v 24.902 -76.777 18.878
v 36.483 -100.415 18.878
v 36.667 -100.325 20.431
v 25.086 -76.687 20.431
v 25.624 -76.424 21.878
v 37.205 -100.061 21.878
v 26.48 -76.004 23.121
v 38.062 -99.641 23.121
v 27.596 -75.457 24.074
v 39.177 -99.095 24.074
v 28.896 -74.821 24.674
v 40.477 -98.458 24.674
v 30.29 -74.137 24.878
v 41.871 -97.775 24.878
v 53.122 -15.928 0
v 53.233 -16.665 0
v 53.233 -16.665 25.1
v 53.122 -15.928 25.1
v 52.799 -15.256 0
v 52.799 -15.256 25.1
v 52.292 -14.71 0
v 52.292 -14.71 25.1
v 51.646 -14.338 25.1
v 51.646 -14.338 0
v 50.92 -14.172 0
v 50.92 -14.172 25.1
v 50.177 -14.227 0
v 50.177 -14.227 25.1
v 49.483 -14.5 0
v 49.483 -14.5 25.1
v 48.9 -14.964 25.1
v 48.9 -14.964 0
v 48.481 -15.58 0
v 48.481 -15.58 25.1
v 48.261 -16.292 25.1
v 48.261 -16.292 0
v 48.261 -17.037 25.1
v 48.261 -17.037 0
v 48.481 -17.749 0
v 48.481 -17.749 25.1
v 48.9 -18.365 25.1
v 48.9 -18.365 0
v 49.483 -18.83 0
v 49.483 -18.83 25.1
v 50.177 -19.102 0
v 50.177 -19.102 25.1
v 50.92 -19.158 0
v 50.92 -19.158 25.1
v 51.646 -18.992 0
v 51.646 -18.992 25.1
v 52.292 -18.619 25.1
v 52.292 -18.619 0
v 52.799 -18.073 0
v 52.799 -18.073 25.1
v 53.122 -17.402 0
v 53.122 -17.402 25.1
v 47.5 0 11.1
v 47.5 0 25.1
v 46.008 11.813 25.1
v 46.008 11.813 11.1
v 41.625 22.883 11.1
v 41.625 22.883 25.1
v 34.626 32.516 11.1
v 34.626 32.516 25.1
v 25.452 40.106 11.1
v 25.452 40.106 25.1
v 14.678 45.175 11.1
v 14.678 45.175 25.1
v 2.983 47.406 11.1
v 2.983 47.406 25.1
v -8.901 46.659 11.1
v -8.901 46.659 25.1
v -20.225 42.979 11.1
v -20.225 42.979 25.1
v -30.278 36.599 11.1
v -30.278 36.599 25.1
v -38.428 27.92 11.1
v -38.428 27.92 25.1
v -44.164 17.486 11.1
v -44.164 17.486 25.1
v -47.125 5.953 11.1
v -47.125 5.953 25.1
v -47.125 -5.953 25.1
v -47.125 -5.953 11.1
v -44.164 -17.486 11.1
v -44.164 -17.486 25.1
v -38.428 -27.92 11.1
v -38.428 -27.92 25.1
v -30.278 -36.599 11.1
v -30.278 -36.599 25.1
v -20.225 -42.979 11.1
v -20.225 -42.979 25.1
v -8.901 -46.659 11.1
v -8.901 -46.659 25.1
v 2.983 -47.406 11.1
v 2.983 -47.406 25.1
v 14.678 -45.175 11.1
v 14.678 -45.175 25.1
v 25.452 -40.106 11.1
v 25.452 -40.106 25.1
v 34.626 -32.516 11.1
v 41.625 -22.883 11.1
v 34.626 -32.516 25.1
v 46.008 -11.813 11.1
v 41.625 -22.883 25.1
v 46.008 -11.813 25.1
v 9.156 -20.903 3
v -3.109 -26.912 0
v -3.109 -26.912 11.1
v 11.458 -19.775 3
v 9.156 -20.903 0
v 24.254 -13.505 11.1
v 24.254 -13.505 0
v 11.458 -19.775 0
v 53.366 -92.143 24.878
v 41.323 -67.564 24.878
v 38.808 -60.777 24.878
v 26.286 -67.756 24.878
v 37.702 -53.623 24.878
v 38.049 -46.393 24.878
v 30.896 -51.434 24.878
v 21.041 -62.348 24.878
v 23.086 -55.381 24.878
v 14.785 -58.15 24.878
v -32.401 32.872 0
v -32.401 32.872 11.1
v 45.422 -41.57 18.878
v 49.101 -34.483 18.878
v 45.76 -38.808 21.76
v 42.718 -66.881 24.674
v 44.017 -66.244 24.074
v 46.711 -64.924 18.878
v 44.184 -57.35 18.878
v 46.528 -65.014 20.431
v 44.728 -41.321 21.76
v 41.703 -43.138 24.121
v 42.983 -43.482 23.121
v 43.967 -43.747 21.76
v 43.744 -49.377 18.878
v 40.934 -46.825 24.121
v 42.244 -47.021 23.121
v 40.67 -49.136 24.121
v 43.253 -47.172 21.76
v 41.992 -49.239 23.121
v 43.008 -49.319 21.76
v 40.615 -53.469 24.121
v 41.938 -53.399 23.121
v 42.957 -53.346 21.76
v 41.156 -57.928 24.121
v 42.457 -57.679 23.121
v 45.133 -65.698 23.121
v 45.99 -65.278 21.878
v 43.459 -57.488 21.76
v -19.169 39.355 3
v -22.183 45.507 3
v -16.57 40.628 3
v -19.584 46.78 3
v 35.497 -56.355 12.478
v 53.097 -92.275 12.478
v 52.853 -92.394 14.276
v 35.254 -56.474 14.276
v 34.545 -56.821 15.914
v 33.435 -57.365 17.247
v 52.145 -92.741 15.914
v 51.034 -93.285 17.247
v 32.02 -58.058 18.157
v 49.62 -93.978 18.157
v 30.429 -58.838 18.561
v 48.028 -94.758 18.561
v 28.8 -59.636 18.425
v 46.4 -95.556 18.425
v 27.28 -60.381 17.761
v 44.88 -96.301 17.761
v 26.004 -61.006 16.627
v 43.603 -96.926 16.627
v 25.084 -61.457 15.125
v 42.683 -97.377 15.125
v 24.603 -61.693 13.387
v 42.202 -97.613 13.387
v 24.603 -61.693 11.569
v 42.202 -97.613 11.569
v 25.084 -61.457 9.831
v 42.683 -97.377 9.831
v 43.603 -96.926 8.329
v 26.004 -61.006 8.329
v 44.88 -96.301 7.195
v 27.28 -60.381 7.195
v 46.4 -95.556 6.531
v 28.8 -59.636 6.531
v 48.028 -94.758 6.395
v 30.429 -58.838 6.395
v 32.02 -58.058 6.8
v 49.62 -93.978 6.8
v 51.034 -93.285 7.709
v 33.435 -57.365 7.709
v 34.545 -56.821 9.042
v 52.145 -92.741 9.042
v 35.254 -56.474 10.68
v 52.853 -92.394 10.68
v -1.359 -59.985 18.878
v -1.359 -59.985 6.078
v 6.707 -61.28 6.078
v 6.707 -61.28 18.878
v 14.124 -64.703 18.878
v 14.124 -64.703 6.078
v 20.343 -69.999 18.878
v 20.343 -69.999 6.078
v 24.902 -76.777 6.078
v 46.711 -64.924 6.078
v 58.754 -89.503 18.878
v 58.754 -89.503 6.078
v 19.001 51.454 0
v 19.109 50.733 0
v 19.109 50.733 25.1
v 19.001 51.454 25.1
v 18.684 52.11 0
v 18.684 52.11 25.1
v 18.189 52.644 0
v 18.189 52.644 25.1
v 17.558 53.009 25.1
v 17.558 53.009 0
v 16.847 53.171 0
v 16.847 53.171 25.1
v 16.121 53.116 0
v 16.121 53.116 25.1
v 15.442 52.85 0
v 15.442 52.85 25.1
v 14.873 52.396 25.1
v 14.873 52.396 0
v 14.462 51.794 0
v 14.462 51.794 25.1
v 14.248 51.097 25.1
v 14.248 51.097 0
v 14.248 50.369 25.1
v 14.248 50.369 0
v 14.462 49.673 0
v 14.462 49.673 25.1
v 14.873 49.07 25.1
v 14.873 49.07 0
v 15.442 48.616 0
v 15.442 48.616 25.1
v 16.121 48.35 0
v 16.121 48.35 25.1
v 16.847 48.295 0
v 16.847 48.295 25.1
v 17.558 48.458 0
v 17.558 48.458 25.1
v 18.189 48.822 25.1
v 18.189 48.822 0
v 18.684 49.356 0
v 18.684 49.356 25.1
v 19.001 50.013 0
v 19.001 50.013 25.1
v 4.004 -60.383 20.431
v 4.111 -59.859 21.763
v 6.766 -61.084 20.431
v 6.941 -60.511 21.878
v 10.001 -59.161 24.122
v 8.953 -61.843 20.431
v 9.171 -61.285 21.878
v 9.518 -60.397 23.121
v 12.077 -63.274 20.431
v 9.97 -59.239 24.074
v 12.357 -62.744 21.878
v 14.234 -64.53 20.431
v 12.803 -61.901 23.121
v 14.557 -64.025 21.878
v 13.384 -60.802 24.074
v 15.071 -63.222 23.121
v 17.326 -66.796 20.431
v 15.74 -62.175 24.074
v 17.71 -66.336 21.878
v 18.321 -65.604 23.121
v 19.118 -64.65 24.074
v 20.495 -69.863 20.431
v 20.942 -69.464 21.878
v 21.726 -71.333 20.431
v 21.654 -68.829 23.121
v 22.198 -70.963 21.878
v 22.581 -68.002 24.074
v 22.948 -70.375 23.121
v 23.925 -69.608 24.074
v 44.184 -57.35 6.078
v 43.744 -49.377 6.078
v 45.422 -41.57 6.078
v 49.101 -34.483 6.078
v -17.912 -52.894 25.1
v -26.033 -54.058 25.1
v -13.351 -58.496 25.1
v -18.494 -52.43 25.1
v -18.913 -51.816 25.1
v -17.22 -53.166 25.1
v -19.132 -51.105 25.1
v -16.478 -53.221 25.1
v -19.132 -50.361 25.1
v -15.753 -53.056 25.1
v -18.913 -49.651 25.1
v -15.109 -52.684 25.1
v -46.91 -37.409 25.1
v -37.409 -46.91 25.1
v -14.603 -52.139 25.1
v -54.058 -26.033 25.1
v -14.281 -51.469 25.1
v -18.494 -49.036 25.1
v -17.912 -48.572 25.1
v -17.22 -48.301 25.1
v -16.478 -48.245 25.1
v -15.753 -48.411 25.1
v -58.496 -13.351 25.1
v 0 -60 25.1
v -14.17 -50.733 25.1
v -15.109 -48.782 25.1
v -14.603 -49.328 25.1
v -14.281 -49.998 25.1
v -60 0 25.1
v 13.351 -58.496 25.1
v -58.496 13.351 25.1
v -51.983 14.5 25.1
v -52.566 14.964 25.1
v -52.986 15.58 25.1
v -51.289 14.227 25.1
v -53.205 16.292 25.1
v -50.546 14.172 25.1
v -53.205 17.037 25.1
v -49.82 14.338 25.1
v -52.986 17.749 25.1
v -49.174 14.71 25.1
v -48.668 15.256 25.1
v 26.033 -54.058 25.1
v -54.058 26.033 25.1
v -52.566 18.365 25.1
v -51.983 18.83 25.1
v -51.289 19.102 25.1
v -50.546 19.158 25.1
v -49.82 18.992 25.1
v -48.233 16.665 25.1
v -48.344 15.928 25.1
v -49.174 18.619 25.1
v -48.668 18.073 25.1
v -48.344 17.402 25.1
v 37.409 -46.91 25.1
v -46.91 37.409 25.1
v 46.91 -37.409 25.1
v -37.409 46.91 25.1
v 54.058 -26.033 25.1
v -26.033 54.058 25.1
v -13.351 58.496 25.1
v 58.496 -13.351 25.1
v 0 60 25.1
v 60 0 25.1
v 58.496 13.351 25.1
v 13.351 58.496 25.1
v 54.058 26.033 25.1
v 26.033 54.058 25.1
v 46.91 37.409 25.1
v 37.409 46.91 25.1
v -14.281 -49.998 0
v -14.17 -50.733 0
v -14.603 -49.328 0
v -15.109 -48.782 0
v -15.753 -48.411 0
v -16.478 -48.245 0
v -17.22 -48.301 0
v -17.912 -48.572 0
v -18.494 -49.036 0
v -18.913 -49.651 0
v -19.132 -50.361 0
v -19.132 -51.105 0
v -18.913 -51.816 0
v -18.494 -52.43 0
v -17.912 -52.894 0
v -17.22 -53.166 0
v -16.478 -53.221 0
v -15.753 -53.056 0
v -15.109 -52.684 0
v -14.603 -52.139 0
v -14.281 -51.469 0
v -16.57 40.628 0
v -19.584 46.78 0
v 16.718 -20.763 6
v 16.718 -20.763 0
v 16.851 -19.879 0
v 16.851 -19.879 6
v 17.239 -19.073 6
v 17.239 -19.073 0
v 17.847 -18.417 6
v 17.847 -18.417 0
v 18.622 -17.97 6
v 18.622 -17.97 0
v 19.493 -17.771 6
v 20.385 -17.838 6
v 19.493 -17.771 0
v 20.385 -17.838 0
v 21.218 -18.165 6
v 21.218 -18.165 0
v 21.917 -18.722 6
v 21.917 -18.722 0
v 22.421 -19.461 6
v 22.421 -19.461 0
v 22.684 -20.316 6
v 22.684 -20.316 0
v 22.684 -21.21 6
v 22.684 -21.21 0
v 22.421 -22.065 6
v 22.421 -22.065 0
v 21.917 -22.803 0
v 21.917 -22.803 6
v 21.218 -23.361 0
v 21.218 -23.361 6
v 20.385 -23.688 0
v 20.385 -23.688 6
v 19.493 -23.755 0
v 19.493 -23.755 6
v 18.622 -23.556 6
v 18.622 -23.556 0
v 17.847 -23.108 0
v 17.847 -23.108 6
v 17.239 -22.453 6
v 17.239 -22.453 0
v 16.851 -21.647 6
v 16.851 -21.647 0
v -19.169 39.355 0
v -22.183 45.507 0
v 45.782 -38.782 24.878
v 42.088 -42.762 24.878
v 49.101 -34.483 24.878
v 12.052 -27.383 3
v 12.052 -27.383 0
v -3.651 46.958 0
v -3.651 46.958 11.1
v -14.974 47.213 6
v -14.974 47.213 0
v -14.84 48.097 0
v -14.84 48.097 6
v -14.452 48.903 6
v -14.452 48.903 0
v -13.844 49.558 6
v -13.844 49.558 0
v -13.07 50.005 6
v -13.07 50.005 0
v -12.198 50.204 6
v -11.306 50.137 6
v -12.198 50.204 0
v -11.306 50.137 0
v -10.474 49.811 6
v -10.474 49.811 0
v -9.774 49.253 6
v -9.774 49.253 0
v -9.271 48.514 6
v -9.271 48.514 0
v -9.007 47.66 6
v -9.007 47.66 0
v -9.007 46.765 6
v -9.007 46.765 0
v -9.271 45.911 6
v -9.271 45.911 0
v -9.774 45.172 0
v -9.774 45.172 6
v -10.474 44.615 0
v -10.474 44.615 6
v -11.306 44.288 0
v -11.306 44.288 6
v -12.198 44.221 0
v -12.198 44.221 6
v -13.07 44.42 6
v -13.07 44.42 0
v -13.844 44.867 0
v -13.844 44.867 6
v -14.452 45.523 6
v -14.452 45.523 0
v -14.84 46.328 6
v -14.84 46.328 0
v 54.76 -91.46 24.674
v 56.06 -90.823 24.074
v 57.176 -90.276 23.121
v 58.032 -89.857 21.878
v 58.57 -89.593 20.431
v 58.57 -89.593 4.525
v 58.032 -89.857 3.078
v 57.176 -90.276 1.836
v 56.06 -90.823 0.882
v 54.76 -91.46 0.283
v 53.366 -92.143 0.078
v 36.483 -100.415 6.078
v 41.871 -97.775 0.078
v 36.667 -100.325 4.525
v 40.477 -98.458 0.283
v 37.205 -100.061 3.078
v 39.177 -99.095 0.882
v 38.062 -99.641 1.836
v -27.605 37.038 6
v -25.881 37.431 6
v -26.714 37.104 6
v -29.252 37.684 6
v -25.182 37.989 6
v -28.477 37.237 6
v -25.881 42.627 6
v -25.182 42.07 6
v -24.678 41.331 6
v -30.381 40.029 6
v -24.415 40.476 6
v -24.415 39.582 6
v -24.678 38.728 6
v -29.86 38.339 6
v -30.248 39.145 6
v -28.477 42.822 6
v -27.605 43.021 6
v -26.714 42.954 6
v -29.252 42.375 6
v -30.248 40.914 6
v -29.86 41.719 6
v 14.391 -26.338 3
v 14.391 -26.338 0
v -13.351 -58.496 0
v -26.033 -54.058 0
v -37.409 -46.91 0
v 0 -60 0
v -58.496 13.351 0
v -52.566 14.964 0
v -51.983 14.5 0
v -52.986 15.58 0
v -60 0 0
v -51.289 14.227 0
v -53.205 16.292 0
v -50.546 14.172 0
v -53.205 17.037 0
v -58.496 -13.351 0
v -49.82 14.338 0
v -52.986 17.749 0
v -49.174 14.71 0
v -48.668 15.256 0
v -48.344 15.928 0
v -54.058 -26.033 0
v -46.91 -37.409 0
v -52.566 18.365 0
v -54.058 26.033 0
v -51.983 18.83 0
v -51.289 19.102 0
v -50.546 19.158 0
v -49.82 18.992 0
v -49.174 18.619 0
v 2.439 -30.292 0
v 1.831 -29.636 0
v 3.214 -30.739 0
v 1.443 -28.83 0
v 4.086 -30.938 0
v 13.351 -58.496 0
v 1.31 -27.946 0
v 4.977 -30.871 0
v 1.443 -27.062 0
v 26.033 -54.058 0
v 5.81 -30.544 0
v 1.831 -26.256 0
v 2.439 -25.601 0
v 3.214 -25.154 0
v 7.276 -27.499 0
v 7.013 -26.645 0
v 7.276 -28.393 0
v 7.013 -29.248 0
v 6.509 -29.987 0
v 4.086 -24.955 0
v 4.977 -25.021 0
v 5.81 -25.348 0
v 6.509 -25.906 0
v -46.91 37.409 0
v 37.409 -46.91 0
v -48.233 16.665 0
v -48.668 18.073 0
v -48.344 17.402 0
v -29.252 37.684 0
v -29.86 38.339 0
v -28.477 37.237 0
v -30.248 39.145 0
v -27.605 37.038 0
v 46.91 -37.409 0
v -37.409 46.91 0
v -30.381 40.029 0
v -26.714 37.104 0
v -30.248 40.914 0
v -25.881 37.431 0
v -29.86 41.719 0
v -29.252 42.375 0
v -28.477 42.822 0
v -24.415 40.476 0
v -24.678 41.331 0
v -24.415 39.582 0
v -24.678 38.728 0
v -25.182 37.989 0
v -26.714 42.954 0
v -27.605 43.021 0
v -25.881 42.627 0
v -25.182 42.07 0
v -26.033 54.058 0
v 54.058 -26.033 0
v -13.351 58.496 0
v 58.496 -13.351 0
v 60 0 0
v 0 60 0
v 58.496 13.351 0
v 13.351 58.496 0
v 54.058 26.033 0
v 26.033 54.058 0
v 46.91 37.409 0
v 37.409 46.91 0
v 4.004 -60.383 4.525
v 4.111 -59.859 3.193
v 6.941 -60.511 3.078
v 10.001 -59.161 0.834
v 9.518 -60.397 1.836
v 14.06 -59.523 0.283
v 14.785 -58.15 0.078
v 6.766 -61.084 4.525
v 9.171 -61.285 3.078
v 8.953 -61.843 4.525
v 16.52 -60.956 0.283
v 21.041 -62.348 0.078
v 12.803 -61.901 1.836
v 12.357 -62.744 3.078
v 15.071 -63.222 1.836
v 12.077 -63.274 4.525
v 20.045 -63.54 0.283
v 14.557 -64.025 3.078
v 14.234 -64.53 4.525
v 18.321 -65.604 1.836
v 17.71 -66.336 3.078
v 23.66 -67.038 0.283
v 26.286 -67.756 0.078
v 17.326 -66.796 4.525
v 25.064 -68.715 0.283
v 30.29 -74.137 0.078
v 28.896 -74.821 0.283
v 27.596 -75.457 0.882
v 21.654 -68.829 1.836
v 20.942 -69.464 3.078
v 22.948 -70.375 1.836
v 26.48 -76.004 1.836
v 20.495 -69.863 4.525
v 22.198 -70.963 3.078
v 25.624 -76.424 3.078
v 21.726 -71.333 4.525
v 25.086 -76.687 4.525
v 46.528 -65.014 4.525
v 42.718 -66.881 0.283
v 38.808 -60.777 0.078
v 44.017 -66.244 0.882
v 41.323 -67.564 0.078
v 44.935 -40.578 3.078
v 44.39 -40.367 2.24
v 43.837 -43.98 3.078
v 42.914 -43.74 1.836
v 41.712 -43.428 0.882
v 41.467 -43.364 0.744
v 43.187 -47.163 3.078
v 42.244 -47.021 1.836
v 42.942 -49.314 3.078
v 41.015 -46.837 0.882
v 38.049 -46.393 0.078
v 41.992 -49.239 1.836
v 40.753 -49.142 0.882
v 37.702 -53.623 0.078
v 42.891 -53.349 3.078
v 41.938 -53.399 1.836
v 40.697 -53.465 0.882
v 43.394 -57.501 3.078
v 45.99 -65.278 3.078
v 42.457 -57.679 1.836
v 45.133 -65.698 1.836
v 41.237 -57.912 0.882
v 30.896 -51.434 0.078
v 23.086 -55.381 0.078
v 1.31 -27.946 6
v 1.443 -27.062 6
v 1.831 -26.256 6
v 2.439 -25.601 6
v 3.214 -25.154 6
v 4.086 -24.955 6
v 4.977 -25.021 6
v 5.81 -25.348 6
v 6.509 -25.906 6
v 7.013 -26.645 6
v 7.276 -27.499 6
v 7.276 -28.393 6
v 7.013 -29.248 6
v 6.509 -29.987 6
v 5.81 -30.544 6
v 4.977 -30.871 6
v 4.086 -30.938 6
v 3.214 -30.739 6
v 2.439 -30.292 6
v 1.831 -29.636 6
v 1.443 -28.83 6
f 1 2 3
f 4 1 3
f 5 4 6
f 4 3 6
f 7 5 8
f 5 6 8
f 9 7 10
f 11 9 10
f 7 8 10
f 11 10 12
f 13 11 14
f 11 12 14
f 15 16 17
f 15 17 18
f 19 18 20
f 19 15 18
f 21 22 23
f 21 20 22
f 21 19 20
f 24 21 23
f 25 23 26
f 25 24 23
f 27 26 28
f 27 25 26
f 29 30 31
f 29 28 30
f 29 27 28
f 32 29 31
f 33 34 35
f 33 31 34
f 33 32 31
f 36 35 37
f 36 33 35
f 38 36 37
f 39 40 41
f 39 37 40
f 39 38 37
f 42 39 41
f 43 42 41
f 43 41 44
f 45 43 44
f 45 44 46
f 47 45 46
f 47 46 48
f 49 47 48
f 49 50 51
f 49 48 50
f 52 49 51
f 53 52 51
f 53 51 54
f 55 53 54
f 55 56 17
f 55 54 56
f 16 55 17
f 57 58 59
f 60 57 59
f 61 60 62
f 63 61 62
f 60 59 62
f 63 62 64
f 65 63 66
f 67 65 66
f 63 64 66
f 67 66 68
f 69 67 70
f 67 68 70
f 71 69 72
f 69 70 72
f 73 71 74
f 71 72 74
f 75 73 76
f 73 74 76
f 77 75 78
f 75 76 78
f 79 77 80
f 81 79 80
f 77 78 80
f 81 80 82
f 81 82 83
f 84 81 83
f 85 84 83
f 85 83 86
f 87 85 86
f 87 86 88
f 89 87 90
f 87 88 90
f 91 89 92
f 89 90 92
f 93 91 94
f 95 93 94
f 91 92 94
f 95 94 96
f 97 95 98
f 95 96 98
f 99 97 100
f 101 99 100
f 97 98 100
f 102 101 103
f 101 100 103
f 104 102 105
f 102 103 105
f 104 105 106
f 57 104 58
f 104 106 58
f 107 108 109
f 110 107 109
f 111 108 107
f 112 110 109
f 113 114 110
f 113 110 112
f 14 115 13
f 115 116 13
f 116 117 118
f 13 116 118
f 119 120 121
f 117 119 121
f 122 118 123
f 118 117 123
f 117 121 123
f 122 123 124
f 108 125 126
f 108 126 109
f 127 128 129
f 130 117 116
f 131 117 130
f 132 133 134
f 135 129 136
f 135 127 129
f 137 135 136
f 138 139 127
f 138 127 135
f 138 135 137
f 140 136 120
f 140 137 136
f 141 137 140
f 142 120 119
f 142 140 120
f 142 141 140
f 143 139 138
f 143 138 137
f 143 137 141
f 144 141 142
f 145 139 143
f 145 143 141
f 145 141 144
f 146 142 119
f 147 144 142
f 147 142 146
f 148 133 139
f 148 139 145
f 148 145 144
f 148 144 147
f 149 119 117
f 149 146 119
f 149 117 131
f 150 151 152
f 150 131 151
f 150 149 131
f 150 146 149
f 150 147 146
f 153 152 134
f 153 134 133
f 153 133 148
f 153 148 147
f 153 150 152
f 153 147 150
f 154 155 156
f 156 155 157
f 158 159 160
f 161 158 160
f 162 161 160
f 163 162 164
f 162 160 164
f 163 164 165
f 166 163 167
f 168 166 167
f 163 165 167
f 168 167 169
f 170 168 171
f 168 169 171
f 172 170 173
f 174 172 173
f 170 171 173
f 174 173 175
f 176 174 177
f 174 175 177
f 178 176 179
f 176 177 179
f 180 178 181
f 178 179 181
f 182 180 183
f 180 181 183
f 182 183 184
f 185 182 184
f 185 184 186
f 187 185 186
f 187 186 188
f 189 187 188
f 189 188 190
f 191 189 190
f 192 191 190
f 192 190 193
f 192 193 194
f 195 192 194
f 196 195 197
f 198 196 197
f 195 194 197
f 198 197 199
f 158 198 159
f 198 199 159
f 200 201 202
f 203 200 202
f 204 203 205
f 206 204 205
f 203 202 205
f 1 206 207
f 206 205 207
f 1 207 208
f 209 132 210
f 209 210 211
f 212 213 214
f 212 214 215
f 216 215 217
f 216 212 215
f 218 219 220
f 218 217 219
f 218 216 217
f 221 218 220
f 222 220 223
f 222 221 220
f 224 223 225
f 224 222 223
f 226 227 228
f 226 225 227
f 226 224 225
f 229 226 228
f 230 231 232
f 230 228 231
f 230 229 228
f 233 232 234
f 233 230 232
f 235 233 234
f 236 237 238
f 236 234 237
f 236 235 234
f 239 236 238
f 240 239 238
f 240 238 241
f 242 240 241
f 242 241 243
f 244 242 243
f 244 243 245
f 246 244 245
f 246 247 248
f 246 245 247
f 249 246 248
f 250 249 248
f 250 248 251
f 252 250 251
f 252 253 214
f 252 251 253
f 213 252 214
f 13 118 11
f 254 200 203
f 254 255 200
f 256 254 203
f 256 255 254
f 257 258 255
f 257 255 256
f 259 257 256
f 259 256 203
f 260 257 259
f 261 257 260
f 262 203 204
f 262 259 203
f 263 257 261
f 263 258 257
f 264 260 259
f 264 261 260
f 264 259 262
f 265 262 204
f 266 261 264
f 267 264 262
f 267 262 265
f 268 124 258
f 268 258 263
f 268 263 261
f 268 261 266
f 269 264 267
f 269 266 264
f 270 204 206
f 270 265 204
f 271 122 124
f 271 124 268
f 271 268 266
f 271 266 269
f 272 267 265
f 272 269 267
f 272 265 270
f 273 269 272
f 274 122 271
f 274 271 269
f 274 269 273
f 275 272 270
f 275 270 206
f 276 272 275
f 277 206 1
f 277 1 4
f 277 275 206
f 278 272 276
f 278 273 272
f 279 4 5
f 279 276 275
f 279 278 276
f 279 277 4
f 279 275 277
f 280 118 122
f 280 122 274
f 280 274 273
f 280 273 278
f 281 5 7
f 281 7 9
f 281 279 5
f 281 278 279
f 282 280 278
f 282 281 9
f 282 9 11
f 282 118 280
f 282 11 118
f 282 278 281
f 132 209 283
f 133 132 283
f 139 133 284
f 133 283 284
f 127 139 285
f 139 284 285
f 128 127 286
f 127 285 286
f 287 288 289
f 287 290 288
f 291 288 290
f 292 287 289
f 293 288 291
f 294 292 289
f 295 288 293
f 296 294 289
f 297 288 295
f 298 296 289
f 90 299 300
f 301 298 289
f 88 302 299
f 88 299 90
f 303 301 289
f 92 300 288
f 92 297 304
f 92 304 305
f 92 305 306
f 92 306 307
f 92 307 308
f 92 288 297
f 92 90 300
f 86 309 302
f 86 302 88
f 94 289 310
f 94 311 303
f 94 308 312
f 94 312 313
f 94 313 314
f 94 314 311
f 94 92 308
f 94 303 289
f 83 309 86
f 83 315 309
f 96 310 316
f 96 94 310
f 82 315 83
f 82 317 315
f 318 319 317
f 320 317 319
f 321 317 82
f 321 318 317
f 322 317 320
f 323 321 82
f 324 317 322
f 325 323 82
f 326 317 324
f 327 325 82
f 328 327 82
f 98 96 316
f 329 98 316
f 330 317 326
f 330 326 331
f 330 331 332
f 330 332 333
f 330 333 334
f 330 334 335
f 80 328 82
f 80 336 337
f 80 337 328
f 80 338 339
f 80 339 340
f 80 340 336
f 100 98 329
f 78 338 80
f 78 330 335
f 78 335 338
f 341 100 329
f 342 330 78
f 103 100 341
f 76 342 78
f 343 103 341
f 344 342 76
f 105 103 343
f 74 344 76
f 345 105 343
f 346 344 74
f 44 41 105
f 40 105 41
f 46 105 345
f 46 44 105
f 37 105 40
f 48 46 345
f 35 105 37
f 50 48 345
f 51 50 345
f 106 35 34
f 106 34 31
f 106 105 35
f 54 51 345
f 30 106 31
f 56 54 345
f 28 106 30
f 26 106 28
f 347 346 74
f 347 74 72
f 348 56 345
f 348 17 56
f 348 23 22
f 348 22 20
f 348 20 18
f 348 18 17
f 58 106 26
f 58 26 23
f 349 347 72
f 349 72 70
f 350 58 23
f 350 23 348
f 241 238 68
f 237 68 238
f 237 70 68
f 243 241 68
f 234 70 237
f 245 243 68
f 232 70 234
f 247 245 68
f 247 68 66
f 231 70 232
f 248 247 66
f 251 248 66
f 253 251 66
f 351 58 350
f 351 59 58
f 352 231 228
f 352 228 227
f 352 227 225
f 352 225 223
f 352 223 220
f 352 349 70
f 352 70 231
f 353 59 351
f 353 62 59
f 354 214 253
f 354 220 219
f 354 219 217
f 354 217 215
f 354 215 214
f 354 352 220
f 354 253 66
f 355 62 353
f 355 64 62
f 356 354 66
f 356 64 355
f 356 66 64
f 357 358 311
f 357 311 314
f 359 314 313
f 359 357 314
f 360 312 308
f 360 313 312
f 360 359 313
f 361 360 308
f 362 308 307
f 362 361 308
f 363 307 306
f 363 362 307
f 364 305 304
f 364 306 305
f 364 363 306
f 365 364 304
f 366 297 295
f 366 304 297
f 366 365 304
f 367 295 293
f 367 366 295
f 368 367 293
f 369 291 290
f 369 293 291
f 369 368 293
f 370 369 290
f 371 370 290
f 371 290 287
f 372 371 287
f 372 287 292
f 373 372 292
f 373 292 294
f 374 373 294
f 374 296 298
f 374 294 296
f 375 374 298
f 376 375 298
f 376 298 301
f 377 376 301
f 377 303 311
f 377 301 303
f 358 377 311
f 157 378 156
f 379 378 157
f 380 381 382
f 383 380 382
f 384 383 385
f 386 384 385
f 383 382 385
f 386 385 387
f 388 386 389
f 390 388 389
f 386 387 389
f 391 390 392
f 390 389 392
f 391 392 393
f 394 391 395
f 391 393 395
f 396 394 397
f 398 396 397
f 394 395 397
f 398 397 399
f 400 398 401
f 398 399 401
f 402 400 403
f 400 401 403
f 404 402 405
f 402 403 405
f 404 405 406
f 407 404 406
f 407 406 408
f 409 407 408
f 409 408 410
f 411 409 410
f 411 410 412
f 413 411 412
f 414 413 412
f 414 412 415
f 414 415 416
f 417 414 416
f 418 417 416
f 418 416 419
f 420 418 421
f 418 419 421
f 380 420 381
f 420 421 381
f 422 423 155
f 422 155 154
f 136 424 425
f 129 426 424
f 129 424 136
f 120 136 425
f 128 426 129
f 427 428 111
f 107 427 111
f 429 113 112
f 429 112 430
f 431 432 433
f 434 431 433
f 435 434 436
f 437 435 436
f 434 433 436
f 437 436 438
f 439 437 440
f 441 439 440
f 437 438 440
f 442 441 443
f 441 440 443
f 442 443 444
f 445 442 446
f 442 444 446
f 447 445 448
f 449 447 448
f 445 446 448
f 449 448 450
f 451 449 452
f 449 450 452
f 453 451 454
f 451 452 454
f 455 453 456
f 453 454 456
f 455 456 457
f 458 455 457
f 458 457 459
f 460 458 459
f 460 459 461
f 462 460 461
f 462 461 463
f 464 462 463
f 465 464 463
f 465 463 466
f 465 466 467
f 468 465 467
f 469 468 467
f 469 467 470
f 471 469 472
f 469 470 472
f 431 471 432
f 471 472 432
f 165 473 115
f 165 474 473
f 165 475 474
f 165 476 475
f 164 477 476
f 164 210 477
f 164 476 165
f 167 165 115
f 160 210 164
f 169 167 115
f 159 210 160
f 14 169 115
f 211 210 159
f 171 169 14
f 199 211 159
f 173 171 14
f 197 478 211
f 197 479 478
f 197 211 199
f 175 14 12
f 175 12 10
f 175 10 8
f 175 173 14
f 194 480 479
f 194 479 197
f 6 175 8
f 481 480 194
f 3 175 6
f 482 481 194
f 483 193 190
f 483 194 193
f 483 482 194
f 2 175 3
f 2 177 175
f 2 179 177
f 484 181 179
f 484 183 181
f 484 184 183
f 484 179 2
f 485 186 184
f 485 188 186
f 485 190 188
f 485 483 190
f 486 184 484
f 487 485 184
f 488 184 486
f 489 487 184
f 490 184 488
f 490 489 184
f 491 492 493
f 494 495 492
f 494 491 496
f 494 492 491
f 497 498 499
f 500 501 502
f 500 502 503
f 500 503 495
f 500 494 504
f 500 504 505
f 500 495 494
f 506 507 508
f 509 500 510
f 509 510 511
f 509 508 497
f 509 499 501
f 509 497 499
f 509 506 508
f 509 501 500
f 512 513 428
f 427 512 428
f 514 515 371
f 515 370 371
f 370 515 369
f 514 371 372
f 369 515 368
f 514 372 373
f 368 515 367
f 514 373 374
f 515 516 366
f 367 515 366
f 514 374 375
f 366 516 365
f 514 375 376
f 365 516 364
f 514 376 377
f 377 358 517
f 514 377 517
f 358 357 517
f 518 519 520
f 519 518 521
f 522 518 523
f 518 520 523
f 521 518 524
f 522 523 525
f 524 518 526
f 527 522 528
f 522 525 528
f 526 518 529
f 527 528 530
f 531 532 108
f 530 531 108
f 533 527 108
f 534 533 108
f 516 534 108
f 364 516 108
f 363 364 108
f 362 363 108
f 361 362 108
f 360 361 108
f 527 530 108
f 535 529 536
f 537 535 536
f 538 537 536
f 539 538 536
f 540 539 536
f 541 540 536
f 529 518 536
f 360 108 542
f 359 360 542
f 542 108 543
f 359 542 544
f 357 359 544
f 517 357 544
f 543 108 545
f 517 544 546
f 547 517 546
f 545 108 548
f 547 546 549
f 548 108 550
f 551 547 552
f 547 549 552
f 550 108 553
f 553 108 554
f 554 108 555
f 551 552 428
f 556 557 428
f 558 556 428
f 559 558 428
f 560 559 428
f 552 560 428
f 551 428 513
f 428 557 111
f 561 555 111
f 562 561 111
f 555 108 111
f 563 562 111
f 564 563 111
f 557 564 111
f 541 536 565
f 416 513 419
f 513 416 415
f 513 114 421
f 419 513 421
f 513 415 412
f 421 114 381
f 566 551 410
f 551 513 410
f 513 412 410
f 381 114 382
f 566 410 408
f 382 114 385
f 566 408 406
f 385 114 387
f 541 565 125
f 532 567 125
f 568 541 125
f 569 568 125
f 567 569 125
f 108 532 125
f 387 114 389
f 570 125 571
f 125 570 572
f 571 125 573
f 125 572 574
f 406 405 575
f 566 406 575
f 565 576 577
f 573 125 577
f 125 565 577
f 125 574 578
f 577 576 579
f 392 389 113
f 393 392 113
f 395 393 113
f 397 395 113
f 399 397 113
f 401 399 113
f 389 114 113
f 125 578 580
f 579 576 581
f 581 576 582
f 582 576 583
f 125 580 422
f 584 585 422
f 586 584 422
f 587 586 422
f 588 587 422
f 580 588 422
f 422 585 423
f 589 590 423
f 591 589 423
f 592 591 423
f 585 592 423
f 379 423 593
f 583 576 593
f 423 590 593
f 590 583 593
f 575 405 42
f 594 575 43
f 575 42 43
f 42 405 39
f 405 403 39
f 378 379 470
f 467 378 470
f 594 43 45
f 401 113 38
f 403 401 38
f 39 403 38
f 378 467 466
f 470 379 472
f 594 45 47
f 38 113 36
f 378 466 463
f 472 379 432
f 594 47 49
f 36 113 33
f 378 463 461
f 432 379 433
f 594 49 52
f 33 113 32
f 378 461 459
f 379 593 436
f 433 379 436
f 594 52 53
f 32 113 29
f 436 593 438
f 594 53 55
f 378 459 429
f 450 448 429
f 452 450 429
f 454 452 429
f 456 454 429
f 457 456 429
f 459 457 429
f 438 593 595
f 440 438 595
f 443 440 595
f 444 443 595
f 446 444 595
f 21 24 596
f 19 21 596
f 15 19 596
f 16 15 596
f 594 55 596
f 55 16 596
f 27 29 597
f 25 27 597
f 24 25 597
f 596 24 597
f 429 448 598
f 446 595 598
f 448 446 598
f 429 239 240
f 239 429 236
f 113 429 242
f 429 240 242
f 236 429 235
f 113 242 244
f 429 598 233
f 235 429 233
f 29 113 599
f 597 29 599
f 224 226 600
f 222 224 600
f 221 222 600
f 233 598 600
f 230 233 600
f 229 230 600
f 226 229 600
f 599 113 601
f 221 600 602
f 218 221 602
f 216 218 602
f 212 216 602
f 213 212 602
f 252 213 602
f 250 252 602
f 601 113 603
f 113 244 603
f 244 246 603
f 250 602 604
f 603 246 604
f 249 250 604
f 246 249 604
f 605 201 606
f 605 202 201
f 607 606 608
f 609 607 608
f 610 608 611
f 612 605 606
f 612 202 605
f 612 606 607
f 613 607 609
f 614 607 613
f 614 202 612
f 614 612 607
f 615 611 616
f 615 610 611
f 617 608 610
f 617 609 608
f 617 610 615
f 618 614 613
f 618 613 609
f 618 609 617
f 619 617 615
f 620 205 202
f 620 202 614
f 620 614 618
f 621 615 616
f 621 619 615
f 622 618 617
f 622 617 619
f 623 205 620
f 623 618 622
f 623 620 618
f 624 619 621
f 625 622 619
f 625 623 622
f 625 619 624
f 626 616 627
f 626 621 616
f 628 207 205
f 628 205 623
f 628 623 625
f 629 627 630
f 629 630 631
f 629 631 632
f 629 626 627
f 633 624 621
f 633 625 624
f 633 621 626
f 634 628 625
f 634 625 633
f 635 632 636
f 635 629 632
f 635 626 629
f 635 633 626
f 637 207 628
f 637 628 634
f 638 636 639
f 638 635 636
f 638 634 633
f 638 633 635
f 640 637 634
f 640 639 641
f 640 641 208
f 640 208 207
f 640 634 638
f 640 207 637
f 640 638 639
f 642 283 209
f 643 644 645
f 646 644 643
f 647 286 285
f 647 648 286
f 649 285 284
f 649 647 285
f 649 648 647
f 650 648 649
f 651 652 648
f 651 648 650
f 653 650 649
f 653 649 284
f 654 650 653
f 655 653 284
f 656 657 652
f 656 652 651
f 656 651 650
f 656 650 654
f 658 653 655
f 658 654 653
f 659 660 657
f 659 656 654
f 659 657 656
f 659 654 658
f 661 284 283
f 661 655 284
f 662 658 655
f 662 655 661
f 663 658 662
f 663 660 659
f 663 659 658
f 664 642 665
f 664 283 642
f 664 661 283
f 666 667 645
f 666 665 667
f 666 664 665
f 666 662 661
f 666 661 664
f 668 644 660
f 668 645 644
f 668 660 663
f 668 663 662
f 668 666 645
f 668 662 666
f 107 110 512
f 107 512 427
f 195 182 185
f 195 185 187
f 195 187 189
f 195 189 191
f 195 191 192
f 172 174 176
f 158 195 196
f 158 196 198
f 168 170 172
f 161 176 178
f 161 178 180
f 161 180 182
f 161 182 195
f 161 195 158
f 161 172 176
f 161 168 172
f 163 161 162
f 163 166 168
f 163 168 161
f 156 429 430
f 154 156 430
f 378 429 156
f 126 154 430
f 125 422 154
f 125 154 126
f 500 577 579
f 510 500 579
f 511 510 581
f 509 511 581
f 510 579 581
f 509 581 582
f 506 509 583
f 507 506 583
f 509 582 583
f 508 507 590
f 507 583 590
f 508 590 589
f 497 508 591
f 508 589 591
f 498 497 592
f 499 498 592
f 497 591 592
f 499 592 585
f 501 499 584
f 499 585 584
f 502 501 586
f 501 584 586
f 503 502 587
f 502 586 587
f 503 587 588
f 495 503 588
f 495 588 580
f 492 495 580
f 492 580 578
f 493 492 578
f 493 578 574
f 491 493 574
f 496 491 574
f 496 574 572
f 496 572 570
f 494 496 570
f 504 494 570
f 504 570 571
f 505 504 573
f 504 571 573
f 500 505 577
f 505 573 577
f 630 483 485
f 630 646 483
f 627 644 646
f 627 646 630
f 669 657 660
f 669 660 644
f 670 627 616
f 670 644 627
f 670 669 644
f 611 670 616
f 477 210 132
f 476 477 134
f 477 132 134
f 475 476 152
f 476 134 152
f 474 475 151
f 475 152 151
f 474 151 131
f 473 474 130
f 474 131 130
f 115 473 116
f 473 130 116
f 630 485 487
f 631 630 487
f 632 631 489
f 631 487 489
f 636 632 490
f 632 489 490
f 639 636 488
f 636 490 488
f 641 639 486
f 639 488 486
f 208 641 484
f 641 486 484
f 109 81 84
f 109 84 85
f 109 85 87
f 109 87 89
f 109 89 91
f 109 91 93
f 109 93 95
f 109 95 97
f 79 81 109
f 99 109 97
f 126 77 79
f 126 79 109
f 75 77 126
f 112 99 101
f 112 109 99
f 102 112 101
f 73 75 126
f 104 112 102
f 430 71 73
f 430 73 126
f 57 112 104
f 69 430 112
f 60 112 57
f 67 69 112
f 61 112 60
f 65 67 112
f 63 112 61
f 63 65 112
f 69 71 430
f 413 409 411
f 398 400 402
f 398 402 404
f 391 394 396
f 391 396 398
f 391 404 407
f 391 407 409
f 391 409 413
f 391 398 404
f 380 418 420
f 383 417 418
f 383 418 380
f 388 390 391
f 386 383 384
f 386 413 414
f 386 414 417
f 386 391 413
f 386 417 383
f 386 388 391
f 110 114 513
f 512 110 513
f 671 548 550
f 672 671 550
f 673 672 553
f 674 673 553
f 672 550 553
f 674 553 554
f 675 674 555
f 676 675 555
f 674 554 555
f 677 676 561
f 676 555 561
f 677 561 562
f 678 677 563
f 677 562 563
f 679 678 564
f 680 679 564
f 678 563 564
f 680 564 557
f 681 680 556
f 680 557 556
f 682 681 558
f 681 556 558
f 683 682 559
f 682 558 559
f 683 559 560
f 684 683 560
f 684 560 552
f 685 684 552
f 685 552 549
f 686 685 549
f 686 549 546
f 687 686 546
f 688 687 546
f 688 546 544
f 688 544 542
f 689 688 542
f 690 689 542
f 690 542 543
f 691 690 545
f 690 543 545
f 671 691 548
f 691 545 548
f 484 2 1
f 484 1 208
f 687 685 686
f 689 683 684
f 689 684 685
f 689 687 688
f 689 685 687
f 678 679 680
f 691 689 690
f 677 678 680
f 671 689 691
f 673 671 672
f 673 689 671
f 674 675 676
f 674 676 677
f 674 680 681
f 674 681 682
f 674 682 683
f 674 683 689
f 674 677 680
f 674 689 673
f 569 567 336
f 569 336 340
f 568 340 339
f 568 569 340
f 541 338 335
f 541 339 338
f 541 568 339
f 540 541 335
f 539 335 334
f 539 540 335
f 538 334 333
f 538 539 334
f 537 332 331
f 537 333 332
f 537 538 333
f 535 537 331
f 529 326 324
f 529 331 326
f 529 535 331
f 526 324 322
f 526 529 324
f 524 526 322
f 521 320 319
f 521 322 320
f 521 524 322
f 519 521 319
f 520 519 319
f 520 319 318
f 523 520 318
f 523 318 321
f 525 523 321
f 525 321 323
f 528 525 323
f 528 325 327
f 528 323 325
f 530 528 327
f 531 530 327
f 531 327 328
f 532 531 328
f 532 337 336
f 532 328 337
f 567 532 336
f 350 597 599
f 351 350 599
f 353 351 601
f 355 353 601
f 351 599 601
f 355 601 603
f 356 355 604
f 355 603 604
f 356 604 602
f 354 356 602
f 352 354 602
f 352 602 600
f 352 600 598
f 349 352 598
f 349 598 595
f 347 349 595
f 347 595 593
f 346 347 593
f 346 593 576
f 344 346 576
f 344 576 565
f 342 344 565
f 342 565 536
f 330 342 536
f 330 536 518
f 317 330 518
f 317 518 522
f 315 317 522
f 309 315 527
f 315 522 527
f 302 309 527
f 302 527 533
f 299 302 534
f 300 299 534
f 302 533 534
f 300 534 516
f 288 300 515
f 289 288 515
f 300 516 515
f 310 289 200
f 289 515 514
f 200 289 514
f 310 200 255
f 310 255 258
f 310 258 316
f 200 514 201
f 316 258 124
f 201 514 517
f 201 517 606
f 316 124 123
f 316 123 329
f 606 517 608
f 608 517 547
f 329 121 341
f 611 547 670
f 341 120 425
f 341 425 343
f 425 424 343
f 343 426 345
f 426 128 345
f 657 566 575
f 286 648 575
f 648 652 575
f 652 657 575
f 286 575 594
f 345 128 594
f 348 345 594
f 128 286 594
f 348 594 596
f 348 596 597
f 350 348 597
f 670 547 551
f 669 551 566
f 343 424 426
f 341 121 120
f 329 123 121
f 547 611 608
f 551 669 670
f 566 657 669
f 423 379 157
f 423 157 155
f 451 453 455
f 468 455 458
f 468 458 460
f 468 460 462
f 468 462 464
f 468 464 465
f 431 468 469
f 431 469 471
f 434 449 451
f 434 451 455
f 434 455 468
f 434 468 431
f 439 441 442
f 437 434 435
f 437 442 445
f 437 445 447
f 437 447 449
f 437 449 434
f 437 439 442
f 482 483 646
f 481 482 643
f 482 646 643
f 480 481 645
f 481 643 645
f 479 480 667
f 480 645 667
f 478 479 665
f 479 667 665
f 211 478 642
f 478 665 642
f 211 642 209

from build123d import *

# Parameters (mm, degrees)
SKETCH1_R                = 60
BOSS_EXTRUDE1_DEPTH      = 25.1
SKETCH3_R                = 47.5
CUT_EXTRUDE2_DEPTH       = 14
CUT_EXTRUDE5_DEPTH       = 89.487343728
CUT_EXTRUDE5_DEPTH_BACK  = 89.487343728
SKETCH2_R                = 2.494998654
SKETCH2_R_2              = 2.5
SKETCH2_R_3              = 2.444443829
SKETCH6_R                = 3
CUT_EXTRUDE6_DEPTH       = 6
CUT_EXTRUDE7_DEPTH       = 87
CUT_EXTRUDE7_DEPTH_BACK  = 87
BOSS_EXTRUDE2_DEPTH      = 30
BOSS_EXTRUDE2_DEPTH_BACK = 23
SKETCH8_W                = 24.8
SKETCH8_H                = 24.8
FILLET1_R                = 30
SKETCH9_R                = 6.1
CUT_EXTRUDE8_DEPTH       = 40
FILLET2_R                = 6
CUT_EXTRUDE9_DEPTH       = 3


with BuildPart() as part:
    # Sketch1 → Boss-Extrude1 (new body)
    with BuildSketch(Plane.XY):
        Circle(SKETCH1_R)
    extrude(amount=BOSS_EXTRUDE1_DEPTH)

    # Sketch3 → Cut-Extrude2 (cut)
    with BuildSketch(Plane.XY.offset(25.1)):
        Circle(SKETCH3_R)
    extrude(amount=-CUT_EXTRUDE2_DEPTH, mode=Mode.SUBTRACT)

    # Sketch2 → Cut-Extrude5 (cut, two sides: drawn at the far end of the back side and taken through both)
    with BuildSketch(Plane.XY.offset(25.1).offset(-CUT_EXTRUDE5_DEPTH_BACK)):
        with Locations((-16.664697145, -50.733104448)):
            Circle(SKETCH2_R)
        with Locations((-50.733105114, 16.664696544)):
            Circle(SKETCH2_R_2)
        with Locations((16.664695878, 50.733104512)):
            Circle(SKETCH2_R_3)
        with Locations((50.733103846, -16.66469648)):
            Circle(SKETCH2_R_2)
    extrude(amount=CUT_EXTRUDE5_DEPTH + CUT_EXTRUDE5_DEPTH_BACK, mode=Mode.SUBTRACT)

    # Sketch6 → Cut-Extrude6 (cut)
    with BuildSketch(Plane(origin=(0, 0, 0), x_dir=(-1, 0, 0), z_dir=(0, 0, -1))):
        with Locations((11.973502988, 47.212610548)):
            Circle(SKETCH6_R)
        with Locations((27.381285989, 40.029281029)):
            Circle(SKETCH6_R)
        with Locations((-19.717656658, -20.762902692)):
            Circle(SKETCH6_R)
        with Locations((-4.309873657, -27.946232212)):
            Circle(SKETCH6_R)
    extrude(amount=-CUT_EXTRUDE6_DEPTH, mode=Mode.SUBTRACT)

    # Sketch7 → Cut-Extrude7 (cut, two sides: drawn at the far end of the back side and taken through both)
    with BuildSketch(Plane.XY.offset(11.1).offset(-CUT_EXTRUDE7_DEPTH_BACK)):
        Polygon((-32.400942803, 32.871850778), (-3.10901045, -26.912408633), (24.254242539, -13.505492441), (-3.650778768, 46.958298756), align=None)
    extrude(amount=CUT_EXTRUDE7_DEPTH + CUT_EXTRUDE7_DEPTH_BACK, mode=Mode.SUBTRACT)

    # Sketch8 → Boss-Extrude2 (add, two sides: drawn at the far end of the back side and taken through both)
    with BuildSketch(Plane(origin=(33.53796733, -68.45033352, 0), x_dir=(-0.8980042769467113, -0.4399867254650012, 0), z_dir=(0.4399867254650012, -0.8980042769467113, 0)).offset(-BOSS_EXTRUDE2_DEPTH_BACK)):
        with Locations((-0.981202476, -12.478185074)):
            Rectangle(SKETCH8_W, SKETCH8_H)
    extrude(amount=BOSS_EXTRUDE2_DEPTH + BOSS_EXTRUDE2_DEPTH_BACK)

    # Fillet1
    fillet1_edges = [part.edges().sort_by_distance(p)[0] for p in [
        (37.75068654, -46.635669457, 12.478185074),
        (15.662587056, -57.91962851, 12.478185074),
    ]]
    fillet(fillet1_edges, radius=FILLET1_R)

    # Sketch9 → Cut-Extrude8 (cut)
    with BuildSketch(Plane(origin=(46.737569094, -95.390461829, 0), x_dir=(0.8980042769467111, 0.43998672546500134, 0), z_dir=(0.43998672546500134, -0.8980042769467111, 0))):
        with Locations((0.981202476, 12.478185074)):
            Circle(SKETCH9_R)
    extrude(amount=-CUT_EXTRUDE8_DEPTH, mode=Mode.SUBTRACT)

    # Fillet2
    # the kernel refuses this fillet: 6 mm, written as the material it takes off along each edge
    with BuildSketch(Plane(origin=(43.083240962, -113.884645314, 0.078185074), x_dir=(0.8980042769467113, 0.4399867254650012, 0), z_dir=(-0.43998672546500117, 0.8980042769467113, 0))) as fillet2_piece_1:
        with BuildLine():
            CenterArc((FILLET2_R, -FILLET2_R), FILLET2_R, 90, 90)
            Line((0, -FILLET2_R), (0, 0))
            Line((0, 0), (FILLET2_R, 0))
        make_face()
    extrude(amount=41.321991464, mode=Mode.SUBTRACT)
    with BuildSketch(Plane(origin=(43.083240962, -113.884645314, 24.878185074), x_dir=(0.8980042769467111, 0.4399867254650013, 0), z_dir=(-0.4399867254650013, 0.8980042769467113, 0))) as fillet2_piece_2:
        with BuildLine():
            CenterArc((FILLET2_R, FILLET2_R), FILLET2_R, 180, 90)
            Line((0, FILLET2_R), (0, 0))
            Line((0, 0), (FILLET2_R, 0))
        make_face()
    extrude(amount=41.321991464, mode=Mode.SUBTRACT)
    with BuildSketch(Plane(origin=(46.711419385, -64.924349442, 24.878185074), x_dir=(-0.8980042769467113, -0.4399867254650012, 0), z_dir=(0.4399867254650012, -0.8980042769467113, 0))) as fillet2_piece_3:
        with BuildLine():
            CenterArc((FILLET2_R, FILLET2_R), FILLET2_R, 180, 90)
            Line((0, FILLET2_R), (0, 0))
            Line((0, 0), (FILLET2_R, 0))
        make_face()
    extrude(amount=42.37020475, mode=Mode.SUBTRACT)
    with BuildSketch(Plane(origin=(46.711419385, -64.924349442, 0.078185074), x_dir=(-0.8980042769467113, -0.4399867254650012, 0), z_dir=(0.43998672546500117, -0.8980042769467113, 0))) as fillet2_piece_4:
        with BuildLine():
            CenterArc((FILLET2_R, -FILLET2_R), FILLET2_R, 90, 90)
            Line((0, -FILLET2_R), (0, 0))
            Line((0, 0), (FILLET2_R, 0))
        make_face()
    extrude(amount=42.37020475, mode=Mode.SUBTRACT)
    with BuildSketch(Plane(origin=(-2.03801506, -89.976922011, 24.878185074), x_dir=(-0.45951638072731243, 0.8881692945848058, 0), z_dir=(-0.8881692945848058, -0.45951638072731243, 0))) as fillet2_piece_5_section:
        with BuildLine():
            CenterArc((30 + FILLET2_R, FILLET2_R), FILLET2_R, 180, 90)
            Line((30, FILLET2_R), (30, 0))
            Line((30, 0), (30 + FILLET2_R, 0))
        make_face()
    fillet2_piece_5 = revolve(axis=Axis((-2.03801506, -89.976922011, 24.878185074), (0, 0, -1)), revolution_arc=91.252870665, mode=Mode.PRIVATE)
    fillet2_piece_5 = fillet2_piece_5 - Plane(origin=(0, 0, 24.878185074), x_dir=(1, 0, 0), z_dir=(0, 0, -1)) * Cylinder(60, 144, mode=Mode.PRIVATE)
    add(fillet2_piece_5, mode=Mode.SUBTRACT)
    with BuildSketch(Plane(origin=(-2.03801506, -89.976922011, 0.078185074), x_dir=(-0.45951638072731255, 0.8881692945848058, 0), z_dir=(-0.8881692945848058, -0.45951638072731255, 0))) as fillet2_piece_6_section:
        with BuildLine():
            CenterArc((30 + FILLET2_R, -FILLET2_R), FILLET2_R, 90, 90)
            Line((30 + FILLET2_R, 0), (30, 0))
            Line((30, 0), (30, -FILLET2_R))
        make_face()
    fillet2_piece_6 = revolve(axis=Axis((-2.03801506, -89.976922011, 0.078185074), (0, 0, -1)), revolution_arc=91.252870665, mode=Mode.PRIVATE)
    fillet2_piece_6 = fillet2_piece_6 - Plane(origin=(0, 0, 0.078185074), x_dir=(1, 0, 0), z_dir=(0, 0, -1)) * Cylinder(60, 144, mode=Mode.PRIVATE)
    add(fillet2_piece_6, mode=Mode.SUBTRACT)
    with BuildSketch(Plane(origin=(73.651547694, -51.724747678, 0.078185074), x_dir=(-0.44255176351936526, 0.8967429601652304, 0), z_dir=(0.8967429601652304, 0.44255176351936526, 0))) as fillet2_piece_7_section:
        with BuildLine():
            CenterArc((30 + FILLET2_R, FILLET2_R), FILLET2_R, 180, 90)
            Line((30 + FILLET2_R, 0), (30, 0))
            Line((30, 0), (30, FILLET2_R))
        make_face()
    fillet2_piece_7 = revolve(axis=Axis((73.651547694, -51.724747678, 0.078185074), (0, 0, 1)), revolution_arc=89.836226794, mode=Mode.PRIVATE)
    fillet2_piece_7 = fillet2_piece_7 - Plane(origin=(0, 0, 0.078185074), x_dir=(1, 0, 0), z_dir=(0, 0, -1)) * Cylinder(60, 144, mode=Mode.PRIVATE)
    add(fillet2_piece_7, mode=Mode.SUBTRACT)
    with BuildSketch(Plane(origin=(73.651547694, -51.724747678, 24.878185074), x_dir=(-0.44255176351936476, 0.8967429601652306, 0), z_dir=(0.8967429601652306, 0.44255176351936476, 0))) as fillet2_piece_8_section:
        with BuildLine():
            CenterArc((30 + FILLET2_R, -FILLET2_R), FILLET2_R, 90, 90)
            Line((30 + FILLET2_R, 0), (30, 0))
            Line((30, 0), (30, -FILLET2_R))
        make_face()
    fillet2_piece_8 = revolve(axis=Axis((73.651547694, -51.724747678, 24.878185074), (0, 0, 1)), revolution_arc=89.836226794, mode=Mode.PRIVATE)
    fillet2_piece_8 = fillet2_piece_8 - Plane(origin=(0, 0, 24.878185074), x_dir=(1, 0, 0), z_dir=(0, 0, -1)) * Cylinder(60, 144, mode=Mode.PRIVATE)
    add(fillet2_piece_8, mode=Mode.SUBTRACT)

    # Sketch12 → Cut-Extrude9 (cut)
    with BuildSketch(Plane(origin=(0, 0, 0), x_dir=(-1, 0, 0), z_dir=(0, 0, -1))):
        Polygon((16.569778792, 40.628497592), (19.583965842, 46.780394242), (22.182787305, 45.507074086), (19.168600256, 39.355177436), align=None)
        Polygon((-11.458078278, -19.775108918), (-14.390783054, -26.33846158), (-12.052056845, -27.383475291), (-9.156328603, -20.902875599), align=None)
    extrude(amount=-CUT_EXTRUDE9_DEPTH, mode=Mode.SUBTRACT)


solid = part.part
